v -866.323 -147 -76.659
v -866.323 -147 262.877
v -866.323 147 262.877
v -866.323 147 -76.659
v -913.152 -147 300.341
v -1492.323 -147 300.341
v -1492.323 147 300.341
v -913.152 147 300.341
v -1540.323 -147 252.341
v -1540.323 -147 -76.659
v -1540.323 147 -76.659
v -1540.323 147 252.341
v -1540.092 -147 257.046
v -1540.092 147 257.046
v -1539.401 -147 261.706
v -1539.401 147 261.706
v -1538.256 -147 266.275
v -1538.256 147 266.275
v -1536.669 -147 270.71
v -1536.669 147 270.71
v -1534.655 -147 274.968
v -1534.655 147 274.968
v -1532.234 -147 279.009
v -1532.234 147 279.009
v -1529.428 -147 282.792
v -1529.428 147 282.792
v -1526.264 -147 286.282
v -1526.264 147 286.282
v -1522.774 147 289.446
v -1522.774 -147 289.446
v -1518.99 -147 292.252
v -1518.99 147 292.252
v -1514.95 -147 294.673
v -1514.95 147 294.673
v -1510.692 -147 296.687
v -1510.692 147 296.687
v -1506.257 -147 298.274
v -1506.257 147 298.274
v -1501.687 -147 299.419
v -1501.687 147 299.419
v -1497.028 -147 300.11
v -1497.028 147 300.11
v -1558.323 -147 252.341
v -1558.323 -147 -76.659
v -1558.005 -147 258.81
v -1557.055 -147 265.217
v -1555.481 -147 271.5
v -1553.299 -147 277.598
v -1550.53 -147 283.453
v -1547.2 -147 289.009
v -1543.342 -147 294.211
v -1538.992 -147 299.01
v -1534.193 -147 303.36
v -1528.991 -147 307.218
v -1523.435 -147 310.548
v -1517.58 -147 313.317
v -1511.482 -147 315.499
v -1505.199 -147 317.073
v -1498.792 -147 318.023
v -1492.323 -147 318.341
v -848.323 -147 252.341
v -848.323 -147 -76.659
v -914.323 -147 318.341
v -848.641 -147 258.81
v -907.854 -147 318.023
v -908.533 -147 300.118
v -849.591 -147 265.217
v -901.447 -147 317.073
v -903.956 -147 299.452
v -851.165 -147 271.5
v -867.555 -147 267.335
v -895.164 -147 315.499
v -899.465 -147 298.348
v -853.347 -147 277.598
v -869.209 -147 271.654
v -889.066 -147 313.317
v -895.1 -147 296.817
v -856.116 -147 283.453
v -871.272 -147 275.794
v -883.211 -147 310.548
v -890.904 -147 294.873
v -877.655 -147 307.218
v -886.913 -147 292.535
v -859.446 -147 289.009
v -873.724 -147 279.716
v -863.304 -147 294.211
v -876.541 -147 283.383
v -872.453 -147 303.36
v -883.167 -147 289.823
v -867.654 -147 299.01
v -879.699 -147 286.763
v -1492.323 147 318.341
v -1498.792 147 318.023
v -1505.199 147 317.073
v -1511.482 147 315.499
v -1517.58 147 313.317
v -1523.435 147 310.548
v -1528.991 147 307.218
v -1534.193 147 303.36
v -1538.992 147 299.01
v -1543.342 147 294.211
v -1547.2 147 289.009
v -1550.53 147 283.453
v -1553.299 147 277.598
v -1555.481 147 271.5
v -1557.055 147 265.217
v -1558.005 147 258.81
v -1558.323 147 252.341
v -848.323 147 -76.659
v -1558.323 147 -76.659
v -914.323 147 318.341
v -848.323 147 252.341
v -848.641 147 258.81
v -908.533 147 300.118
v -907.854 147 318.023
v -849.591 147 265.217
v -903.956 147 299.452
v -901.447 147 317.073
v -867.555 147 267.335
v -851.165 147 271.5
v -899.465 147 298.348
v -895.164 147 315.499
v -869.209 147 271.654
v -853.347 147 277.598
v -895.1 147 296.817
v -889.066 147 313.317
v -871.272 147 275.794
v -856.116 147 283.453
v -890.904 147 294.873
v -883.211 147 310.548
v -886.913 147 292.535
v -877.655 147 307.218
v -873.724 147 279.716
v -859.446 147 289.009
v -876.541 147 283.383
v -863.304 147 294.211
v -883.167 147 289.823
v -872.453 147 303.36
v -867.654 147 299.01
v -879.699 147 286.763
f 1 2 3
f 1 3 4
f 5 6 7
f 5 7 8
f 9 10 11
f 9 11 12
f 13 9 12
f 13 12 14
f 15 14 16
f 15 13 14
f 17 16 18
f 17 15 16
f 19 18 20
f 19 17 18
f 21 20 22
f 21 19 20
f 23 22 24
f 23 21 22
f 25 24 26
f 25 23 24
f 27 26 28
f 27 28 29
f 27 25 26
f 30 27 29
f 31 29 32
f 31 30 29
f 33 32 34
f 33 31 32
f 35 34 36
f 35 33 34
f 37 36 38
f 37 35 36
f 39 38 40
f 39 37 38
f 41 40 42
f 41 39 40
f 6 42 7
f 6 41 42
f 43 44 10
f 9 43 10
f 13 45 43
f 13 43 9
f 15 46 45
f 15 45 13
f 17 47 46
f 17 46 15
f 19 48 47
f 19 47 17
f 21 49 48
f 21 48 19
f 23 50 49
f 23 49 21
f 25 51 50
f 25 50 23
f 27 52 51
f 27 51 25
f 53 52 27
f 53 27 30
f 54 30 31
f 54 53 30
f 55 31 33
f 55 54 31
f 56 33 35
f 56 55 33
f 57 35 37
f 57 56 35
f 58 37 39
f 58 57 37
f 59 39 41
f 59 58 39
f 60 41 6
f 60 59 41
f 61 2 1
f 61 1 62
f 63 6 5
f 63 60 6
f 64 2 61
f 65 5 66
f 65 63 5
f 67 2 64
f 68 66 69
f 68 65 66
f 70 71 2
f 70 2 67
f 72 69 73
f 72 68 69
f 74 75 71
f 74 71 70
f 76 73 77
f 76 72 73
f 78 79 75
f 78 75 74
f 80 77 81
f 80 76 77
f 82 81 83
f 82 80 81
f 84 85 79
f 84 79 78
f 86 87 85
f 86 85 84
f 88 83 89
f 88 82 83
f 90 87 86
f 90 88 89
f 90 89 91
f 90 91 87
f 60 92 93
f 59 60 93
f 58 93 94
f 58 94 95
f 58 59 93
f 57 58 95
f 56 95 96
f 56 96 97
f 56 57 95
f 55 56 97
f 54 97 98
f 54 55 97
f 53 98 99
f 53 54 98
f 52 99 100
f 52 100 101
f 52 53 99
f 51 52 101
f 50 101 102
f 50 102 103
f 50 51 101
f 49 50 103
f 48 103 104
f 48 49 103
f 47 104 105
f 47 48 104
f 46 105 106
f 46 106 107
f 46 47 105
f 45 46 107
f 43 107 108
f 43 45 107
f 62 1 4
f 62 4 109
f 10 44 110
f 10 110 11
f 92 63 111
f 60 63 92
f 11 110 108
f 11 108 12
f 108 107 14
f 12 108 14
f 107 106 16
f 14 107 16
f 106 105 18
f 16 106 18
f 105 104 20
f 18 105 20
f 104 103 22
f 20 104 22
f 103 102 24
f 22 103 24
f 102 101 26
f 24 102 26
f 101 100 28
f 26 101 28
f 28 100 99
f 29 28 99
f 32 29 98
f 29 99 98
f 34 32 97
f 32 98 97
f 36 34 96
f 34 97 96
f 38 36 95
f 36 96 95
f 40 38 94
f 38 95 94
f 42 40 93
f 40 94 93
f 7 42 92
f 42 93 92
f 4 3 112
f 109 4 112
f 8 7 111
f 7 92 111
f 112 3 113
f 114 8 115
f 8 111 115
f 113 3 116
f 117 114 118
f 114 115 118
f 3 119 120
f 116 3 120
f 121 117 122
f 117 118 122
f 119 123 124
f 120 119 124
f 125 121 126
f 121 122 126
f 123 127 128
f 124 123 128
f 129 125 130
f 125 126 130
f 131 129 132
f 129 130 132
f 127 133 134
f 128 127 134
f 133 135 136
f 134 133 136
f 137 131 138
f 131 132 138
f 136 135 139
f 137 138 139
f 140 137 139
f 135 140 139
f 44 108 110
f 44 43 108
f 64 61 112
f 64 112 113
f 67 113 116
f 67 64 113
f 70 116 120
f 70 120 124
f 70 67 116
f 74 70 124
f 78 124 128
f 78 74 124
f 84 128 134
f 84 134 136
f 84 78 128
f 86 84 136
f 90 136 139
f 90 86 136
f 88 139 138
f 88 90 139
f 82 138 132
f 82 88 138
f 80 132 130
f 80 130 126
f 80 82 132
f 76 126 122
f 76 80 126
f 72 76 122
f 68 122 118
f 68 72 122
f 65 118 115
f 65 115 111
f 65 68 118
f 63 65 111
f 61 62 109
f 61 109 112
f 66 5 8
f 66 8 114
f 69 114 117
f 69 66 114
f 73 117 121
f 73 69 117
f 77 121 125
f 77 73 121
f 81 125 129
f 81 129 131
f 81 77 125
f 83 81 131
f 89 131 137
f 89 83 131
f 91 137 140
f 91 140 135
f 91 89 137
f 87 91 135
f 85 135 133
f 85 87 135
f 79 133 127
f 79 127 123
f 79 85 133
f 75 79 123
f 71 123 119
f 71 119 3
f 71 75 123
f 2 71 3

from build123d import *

# Parameters (mm, degrees)
F1_DEPTH = 147


with BuildPart() as f1:
    # F0 (on Front) → F1 (new body, symmetric)
    with BuildSketch(Plane.XZ):
        with BuildLine():
            Line((-1558.323113, 252.341221), (-1558.323113, -76.658779))
            Line((-1558.323113, -76.658779), (-1540.323113, -76.658779))
            Line((-1540.323113, -76.658779), (-1540.323113, 252.341221))
            ThreePointArc((-1540.323113, 252.341221), (-1526.264239, 286.282347), (-1492.323113, 300.341221))
            Line((-1492.323113, 300.341221), (-913.152471, 300.341221))
            ThreePointArc((-913.152471, 300.341221), (-883.16695, 289.822797), (-866.323113, 262.87741))
            Line((-866.323113, 262.87741), (-866.323113, -76.658779))
            Line((-866.323113, -76.658779), (-848.323113, -76.658779))
            Line((-848.323113, -76.658779), (-848.323113, 252.341221))
            ThreePointArc((-848.323113, 252.341221), (-867.654066, 299.010269), (-914.323113, 318.341221))
            Line((-914.323113, 318.341221), (-1492.323113, 318.341221))
            ThreePointArc((-1492.323113, 318.341221), (-1538.992161, 299.010269), (-1558.323113, 252.341221))
        make_face()
    extrude(amount=F1_DEPTH, both=True)


solid = f1.part
